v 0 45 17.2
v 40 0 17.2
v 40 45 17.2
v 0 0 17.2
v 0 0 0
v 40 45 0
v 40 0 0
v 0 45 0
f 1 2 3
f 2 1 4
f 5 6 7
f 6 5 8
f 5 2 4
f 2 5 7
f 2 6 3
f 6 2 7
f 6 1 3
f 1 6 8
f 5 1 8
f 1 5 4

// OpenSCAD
height = 8.2+6+3;

cube([40,45,height]);

/*
	//WireChannels
	translate([width/2-11,4,height/2])	difference(){
	cube([11.5,19,4]);
	translate([2,-.5,-0.5])cube([10,17.5,5]);
	}
	mirror([1,0,0])	translate([width/2-11,4,height/2])
	difference(){
	cube([11.5,19,4]);
	translate([2,-.5,-0.5])cube([10,17.5,5]);
	}
	*/
